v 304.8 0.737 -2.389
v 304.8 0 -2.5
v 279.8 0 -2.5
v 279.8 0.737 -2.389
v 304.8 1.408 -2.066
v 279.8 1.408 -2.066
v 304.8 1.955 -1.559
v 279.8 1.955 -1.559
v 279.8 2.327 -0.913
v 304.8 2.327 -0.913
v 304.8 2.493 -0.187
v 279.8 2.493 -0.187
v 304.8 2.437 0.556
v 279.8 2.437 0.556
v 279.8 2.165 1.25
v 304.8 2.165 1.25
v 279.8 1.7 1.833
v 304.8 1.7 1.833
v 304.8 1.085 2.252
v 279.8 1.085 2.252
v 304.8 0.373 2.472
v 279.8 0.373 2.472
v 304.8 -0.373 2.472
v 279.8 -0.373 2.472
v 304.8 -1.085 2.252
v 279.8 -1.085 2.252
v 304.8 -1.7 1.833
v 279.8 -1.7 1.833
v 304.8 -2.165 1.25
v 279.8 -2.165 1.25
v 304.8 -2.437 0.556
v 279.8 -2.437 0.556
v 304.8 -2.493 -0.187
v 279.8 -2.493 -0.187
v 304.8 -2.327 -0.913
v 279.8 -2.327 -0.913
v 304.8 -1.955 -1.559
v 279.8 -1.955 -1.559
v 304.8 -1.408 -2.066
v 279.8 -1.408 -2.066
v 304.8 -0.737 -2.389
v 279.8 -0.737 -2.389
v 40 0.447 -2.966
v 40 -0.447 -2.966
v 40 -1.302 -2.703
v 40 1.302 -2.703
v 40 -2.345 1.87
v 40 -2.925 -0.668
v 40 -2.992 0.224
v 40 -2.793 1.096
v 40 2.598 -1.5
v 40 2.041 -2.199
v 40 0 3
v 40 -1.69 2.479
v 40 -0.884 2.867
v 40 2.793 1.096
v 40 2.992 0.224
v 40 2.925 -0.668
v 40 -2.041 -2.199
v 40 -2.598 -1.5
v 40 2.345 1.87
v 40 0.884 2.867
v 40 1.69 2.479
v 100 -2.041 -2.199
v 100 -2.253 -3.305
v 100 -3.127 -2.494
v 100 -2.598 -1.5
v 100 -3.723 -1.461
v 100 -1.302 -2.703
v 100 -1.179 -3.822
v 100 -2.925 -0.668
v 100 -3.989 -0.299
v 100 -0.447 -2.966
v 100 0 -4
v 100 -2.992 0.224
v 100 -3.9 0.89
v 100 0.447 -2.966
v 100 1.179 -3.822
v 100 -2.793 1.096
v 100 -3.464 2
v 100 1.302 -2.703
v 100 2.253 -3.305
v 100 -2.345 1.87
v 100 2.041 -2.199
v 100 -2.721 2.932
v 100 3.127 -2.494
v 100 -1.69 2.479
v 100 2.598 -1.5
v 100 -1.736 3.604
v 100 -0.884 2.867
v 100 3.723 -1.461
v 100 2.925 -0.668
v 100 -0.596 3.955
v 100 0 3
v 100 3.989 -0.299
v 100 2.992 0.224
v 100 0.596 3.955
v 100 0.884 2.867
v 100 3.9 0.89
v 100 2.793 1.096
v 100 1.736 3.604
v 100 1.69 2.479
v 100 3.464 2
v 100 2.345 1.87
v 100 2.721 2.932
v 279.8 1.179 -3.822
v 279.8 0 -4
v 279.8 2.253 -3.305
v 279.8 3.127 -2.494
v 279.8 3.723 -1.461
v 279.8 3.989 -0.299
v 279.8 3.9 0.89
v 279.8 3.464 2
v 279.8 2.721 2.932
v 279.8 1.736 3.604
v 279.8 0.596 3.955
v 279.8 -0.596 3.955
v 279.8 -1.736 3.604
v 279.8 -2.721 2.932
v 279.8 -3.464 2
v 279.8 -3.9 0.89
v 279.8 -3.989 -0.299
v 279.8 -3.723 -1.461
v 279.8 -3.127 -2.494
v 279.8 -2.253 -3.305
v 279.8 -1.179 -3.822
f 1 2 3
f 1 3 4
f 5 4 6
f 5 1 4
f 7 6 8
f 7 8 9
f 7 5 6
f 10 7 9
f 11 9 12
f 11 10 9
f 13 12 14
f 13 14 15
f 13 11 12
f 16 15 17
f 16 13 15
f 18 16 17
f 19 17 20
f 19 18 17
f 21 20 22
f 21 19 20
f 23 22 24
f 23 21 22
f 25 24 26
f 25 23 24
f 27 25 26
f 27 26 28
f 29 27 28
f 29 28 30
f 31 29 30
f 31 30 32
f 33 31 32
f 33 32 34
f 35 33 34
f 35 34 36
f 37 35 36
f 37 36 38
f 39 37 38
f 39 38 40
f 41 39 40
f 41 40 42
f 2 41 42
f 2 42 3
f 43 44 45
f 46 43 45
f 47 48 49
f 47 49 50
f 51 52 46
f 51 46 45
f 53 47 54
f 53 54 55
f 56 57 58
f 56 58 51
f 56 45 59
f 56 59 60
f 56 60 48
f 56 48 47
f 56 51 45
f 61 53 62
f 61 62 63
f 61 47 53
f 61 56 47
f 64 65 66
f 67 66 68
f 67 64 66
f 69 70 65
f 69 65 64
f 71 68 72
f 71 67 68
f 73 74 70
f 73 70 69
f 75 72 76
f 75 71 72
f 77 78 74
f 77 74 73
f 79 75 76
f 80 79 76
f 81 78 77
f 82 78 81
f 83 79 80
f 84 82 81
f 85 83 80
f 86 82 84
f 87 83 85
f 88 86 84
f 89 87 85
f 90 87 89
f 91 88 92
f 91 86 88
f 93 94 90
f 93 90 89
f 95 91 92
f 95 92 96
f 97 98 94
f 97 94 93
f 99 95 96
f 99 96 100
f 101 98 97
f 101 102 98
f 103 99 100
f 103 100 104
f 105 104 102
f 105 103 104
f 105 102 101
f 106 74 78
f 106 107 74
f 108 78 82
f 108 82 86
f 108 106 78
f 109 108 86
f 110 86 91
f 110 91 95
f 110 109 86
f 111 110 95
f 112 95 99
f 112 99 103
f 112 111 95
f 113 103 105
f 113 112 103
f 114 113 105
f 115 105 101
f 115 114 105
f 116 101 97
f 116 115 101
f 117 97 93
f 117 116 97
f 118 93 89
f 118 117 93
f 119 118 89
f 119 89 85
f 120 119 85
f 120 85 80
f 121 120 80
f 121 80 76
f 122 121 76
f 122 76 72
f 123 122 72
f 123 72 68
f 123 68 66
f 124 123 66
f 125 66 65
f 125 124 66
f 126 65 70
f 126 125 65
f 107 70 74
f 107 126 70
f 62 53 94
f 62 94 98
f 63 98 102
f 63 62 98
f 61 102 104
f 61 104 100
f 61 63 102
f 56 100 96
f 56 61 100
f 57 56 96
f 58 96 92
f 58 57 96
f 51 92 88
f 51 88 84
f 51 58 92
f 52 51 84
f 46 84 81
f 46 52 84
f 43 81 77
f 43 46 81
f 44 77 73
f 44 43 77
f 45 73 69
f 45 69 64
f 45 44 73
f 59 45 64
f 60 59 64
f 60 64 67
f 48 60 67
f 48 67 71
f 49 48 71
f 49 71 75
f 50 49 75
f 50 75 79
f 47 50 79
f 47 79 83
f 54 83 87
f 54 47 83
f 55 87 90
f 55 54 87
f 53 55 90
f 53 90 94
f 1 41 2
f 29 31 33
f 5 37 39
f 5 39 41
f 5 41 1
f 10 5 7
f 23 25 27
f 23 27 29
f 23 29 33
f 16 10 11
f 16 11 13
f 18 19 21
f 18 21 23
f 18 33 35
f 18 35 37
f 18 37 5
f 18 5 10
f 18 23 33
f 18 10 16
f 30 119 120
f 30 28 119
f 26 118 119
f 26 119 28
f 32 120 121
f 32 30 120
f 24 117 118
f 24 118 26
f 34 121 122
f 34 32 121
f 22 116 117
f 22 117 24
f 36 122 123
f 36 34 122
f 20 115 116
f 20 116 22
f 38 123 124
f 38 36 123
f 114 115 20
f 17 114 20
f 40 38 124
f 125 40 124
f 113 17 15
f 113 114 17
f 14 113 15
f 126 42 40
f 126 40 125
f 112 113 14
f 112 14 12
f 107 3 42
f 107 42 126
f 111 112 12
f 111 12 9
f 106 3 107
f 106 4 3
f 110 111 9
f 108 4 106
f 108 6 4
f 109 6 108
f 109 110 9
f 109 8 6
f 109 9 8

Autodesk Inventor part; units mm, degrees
ref_plane "YZ Plane" through (0, 0, 0) normal (1, 0, 0) x (0, 1, 0)
ref_plane "XZ Plane" through (0, 0, 0) normal (0, 1, 0) x (-1, 0, 0)
ref_plane "XY Plane" through (0, 0, 0) normal (0, 0, 1) x (1, 0, 0)
sketch "Sketch1" plane through (0, 0, 0) normal (1, 0, 0) x (0, 1, 0)
  circle A0 centre (0, 0) radius 6.35
  dimension "d0" = 12.7
extrude "Extrusion1" add sketch "Sketch1" along normal blind 304.8
sketch "Sketch2" plane through (304.8, 0, 0) normal (1, 0, 0) x (0, 0, -1)
  circle A0 centre (0, 0) radius 4.7625
  circle A1 centre (0, 0) radius 6.35
  dimension "d3" = 9.525
extrude "Extrusion2" cut sketch "Sketch2" against normal blind 385.2875
sketch "Sketch3" plane through (304.8, 0, 0) normal (1, 0, 0) x (0, 0, -1)
  circle A0 centre (0, 0) radius 4
  circle A1 centre (0, 0) radius 4.7625 projected
  dimension "d6" = 8
extrude "Extrusion3" cut sketch "Sketch3" against normal blind 369.4125
sketch "Sketch4" plane through (304.8, 0, 0) normal (1, 0, 0) x (0, 0, -1)
  circle A0 centre (0, 0) radius 3
  circle A1 centre (0, 0) radius 4 projected
  dimension "d9" = 6
extrude "Extrusion4" cut sketch "Sketch4" against normal blind 25
sketch "Sketch5" plane through (0, 0, 0) normal (-1, 0, 0) x (0, 0, 1)
  circle A0 centre (0, 0) radius 2.5
  circle A1 centre (0, 0) radius 4 projected
  dimension "d12" = 5
extrude "Extrusion5" cut sketch "Sketch5" against normal blind 25
sketch "Sketch7" plane through (304.8, 0, 0) normal (1, 0, 0) x (0, 0, -1)
  circle A0 centre (0, 0) radius 2.5
  circle A1 centre (0, 0) radius 3 projected
  dimension "d15" = 5
extrude "Extrusion6" cut sketch "Sketch7" against normal blind 25
sketch "Sketch8" plane through (0, 0, 0) normal (-1, 0, 0) x (0, 0, 1)
  circle A0 centre (0, 0) radius 4
  dimension "d18" = 8
extrude "Extrusion7" cut sketch "Sketch8" against normal blind 100
sketch "Sketch9" plane through (100, 0, 0) normal (-1, 0, 0) x (0, 0, 1)
  circle A0 centre (0, 0) radius 4 projected
extrude "Extrusion8" add sketch "Sketch9" along normal blind 60
sketch "Sketch10" plane through (40, 0, 0) normal (-1, 0, 0) x (0, 0, 1)
  circle A0 centre (0, 0) radius 3
  circle A1 centre (0, 0) radius 4 projected
  dimension "d23" = 6
extrude "Extrusion9" cut sketch "Sketch10" against normal blind 60
properties part number "Lead_Shaft" material "Steel, Carbon"
